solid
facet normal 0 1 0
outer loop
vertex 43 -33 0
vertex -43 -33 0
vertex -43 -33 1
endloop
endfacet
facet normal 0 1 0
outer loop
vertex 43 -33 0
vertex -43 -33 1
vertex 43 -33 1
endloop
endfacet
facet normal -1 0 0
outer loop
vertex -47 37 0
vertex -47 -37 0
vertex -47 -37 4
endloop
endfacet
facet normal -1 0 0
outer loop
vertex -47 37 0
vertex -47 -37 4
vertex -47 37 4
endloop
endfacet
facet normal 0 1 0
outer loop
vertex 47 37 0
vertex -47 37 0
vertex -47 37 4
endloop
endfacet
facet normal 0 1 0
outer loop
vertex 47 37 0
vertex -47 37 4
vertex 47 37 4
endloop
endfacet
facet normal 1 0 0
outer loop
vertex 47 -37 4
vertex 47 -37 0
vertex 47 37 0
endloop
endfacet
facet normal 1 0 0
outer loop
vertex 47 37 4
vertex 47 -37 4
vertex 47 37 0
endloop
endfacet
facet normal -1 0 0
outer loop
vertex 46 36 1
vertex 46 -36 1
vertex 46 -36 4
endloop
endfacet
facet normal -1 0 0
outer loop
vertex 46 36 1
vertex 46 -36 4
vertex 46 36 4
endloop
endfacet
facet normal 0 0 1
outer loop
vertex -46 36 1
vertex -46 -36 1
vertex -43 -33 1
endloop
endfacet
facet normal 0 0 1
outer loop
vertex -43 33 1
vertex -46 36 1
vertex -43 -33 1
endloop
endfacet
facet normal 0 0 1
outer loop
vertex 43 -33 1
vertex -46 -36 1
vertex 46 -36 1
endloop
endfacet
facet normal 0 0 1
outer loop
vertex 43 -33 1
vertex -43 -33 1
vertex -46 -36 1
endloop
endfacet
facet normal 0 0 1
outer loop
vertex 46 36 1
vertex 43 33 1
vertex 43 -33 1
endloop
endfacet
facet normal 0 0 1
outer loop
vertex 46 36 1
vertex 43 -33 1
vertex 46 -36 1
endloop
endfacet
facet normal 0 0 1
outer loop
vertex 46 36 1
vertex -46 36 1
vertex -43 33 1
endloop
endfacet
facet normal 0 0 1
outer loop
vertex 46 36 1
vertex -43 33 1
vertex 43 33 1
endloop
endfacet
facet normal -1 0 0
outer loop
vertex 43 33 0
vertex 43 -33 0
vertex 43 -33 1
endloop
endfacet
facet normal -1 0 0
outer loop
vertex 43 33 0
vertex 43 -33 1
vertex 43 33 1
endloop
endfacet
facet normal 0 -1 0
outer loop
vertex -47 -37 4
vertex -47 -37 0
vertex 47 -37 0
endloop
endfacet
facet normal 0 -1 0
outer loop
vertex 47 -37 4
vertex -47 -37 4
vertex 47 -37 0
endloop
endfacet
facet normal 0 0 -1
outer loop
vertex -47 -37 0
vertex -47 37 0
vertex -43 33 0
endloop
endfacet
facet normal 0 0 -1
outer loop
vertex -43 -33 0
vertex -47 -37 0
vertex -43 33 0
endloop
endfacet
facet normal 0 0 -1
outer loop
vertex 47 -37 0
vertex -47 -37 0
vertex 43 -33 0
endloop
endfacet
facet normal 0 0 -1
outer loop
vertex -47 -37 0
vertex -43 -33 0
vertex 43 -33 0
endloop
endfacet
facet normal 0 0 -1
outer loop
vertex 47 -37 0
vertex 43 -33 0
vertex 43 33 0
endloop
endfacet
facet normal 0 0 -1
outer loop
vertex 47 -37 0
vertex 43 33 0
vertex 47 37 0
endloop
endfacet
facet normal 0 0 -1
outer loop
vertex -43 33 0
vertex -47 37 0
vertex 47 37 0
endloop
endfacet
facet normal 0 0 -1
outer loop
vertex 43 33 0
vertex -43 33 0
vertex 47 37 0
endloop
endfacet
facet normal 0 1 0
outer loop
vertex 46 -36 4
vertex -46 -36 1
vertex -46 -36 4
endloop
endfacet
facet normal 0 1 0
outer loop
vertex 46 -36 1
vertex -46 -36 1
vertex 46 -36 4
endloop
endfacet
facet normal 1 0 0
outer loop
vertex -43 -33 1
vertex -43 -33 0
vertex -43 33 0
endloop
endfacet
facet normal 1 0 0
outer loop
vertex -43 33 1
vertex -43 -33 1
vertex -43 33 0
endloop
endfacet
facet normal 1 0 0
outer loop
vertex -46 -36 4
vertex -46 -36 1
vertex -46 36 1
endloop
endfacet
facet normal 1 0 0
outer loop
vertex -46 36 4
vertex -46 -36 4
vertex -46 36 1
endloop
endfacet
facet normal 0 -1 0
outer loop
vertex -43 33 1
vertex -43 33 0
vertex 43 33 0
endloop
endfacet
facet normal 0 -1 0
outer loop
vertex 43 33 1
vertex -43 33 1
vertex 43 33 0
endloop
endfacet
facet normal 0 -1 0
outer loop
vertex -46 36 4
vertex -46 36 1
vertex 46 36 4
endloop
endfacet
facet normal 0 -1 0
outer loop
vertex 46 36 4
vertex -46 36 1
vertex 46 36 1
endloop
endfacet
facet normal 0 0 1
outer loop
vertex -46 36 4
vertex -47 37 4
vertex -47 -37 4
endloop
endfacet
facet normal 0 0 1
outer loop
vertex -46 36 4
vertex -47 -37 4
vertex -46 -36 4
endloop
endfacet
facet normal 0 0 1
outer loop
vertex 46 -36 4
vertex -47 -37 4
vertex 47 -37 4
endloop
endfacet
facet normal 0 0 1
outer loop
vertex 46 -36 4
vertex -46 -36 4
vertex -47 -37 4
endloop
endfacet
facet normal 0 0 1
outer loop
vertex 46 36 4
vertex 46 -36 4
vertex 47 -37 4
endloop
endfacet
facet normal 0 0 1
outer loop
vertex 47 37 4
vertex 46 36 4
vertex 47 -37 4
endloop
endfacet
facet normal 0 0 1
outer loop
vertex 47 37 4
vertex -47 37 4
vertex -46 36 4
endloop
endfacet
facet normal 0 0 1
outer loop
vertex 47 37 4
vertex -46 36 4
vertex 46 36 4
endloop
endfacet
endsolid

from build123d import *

# Parameters (mm, degrees)
F0_W     = 94
F0_H     = 74
F0_W_2   = 92
F0_H_2   = 72
F1_DEPTH = 4
F0_W_3   = 86
F0_H_3   = 66
F2_DEPTH = 1


with BuildPart() as f1:
    # F0 (on Top) → F1 (new body)
    with BuildSketch(Plane.XY):
        Rectangle(F0_W, F0_H)
        Rectangle(F0_W_2, F0_H_2, mode=Mode.SUBTRACT)
    extrude(amount=F1_DEPTH)

    # F0 (on Top) → F2 (join)
    with BuildSketch(Plane.XY):
        Rectangle(F0_W_2, F0_H_2)
        Rectangle(F0_W_3, F0_H_3, mode=Mode.SUBTRACT)
    extrude(amount=F2_DEPTH)


solid = f1.part
